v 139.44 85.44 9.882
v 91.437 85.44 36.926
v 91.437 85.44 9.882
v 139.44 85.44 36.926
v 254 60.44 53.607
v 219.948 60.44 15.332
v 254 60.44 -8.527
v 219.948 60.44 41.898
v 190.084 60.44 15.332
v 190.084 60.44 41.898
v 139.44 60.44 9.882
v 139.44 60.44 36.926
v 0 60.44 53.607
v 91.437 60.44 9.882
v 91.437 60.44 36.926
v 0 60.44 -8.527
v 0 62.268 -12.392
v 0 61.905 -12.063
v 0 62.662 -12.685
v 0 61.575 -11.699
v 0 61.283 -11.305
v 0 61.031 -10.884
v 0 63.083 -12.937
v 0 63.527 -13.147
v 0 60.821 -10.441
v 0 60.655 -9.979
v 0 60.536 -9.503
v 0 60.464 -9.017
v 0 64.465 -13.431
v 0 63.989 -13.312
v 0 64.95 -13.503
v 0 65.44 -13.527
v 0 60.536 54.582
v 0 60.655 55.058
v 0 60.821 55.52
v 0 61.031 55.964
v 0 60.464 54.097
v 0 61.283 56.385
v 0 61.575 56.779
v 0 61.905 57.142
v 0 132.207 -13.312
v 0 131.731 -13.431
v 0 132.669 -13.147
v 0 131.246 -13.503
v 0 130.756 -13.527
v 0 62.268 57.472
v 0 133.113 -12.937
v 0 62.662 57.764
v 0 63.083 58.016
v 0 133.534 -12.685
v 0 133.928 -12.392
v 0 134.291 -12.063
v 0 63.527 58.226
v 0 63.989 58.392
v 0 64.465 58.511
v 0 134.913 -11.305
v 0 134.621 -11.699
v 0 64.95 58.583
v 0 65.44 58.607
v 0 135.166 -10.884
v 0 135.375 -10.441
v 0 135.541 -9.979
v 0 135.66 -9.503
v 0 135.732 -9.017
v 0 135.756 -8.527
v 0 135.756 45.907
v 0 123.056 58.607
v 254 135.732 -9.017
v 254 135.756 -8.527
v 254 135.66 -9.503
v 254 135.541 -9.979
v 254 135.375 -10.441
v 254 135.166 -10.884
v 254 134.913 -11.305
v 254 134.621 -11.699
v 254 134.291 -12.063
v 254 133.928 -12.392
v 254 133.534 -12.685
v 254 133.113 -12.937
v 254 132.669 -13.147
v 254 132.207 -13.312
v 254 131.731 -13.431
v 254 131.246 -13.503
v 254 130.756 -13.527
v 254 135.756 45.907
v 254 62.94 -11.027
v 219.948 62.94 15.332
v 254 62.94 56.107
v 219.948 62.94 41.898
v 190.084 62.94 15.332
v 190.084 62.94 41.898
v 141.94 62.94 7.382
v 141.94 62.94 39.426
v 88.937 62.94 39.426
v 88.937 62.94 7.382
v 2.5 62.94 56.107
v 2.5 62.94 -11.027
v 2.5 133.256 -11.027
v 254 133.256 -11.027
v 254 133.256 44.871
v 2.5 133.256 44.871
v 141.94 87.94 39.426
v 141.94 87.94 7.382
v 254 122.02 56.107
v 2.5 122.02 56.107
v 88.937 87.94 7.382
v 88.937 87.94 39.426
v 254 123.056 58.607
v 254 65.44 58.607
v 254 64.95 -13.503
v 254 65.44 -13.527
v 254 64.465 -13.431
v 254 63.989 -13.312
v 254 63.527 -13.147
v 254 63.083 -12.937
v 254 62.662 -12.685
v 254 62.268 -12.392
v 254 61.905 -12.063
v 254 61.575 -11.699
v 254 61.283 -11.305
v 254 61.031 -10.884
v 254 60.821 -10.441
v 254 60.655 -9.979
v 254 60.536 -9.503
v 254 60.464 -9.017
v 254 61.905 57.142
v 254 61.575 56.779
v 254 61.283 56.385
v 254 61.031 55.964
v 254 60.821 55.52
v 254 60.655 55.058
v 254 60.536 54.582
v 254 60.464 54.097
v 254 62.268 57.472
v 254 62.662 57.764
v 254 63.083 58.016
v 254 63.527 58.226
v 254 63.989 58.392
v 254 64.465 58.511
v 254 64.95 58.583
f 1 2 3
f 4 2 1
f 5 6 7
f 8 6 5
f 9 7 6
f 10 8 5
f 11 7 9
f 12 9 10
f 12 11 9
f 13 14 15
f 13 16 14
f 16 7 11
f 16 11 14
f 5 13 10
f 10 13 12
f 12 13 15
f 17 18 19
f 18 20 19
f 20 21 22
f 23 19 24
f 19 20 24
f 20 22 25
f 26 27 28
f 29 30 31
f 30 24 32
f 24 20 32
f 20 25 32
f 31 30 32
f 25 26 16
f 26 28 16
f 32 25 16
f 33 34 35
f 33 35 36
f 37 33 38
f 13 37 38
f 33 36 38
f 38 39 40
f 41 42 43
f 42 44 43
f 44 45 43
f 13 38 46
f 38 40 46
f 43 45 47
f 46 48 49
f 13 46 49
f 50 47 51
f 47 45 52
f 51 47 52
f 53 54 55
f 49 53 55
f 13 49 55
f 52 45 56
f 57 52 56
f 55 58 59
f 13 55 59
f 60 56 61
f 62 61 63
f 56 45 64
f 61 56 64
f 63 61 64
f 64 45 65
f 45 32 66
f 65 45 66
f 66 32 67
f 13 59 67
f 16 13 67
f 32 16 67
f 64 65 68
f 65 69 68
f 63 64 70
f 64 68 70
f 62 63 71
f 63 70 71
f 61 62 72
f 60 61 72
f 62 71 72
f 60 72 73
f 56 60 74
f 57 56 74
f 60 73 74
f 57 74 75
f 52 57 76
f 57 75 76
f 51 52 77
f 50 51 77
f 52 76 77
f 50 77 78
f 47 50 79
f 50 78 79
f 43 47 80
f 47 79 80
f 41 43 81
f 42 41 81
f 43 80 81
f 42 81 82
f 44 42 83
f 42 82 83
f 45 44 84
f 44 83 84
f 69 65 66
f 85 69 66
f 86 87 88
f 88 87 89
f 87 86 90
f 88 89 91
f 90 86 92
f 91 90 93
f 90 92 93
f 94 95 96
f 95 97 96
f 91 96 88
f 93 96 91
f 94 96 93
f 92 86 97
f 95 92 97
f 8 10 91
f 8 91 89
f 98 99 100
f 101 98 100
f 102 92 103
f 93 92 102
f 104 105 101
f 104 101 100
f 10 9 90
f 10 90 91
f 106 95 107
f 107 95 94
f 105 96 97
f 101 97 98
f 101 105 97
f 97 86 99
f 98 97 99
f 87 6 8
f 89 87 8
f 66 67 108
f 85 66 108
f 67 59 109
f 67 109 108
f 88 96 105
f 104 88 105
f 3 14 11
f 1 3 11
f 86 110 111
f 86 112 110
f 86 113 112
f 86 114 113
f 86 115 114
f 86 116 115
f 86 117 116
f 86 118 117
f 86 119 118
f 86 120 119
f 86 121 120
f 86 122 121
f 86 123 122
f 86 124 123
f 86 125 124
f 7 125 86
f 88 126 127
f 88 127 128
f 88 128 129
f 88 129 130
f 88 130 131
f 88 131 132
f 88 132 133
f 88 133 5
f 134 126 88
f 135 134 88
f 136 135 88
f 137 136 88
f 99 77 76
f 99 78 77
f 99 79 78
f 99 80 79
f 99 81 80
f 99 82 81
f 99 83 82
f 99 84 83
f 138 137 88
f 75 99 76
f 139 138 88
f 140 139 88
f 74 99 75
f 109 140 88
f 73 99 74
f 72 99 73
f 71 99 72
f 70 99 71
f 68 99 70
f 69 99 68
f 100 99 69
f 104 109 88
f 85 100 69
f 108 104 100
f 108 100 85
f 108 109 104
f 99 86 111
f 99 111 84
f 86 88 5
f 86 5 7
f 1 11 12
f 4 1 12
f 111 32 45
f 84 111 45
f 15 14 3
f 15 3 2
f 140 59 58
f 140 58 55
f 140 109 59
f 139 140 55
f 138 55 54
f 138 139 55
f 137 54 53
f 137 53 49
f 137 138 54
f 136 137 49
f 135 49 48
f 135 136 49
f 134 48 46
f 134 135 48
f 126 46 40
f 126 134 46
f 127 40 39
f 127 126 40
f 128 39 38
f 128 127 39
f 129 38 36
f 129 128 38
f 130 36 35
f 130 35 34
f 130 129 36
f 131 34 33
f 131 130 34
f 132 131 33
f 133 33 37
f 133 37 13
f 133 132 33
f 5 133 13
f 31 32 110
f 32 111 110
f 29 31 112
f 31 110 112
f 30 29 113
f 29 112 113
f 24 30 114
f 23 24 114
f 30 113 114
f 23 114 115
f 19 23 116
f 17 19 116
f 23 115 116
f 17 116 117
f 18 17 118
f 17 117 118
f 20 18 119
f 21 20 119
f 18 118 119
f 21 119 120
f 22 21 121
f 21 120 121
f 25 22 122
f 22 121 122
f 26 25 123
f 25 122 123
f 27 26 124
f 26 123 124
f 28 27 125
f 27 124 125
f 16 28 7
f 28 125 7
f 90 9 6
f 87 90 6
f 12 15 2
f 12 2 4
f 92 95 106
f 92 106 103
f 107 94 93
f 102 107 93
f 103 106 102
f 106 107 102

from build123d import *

# Parameters (mm, degrees)
F0_W     = 75.315695256
F0_H     = 72.1342116594
F1_DEPTH = 254
F2_SIZE  = 12.7
F3_W     = 48.0028837919
F3_H     = 27.0442329347
F4_DEPTH = 25
F5_T     = -2.5
F6_R     = 5
F7_W     = 29.8640429974
F7_H     = 26.566028595
F8_DEPTH = 25


with BuildPart() as f1:
    # F0 (on Right) → F1 (new body)
    with BuildSketch(Plane.YZ):
        with Locations((98.0980489403, 22.5397534668)):
            Rectangle(F0_W, F0_H)
    extrude(amount=F1_DEPTH)

    # F2
    f2_edges = [f1.edges().sort_by_distance(p)[0] for p in [
        (127, 135.755897, 58.606859),
    ]]
    chamfer(f2_edges, length=F2_SIZE)

    # F3 (on face) → F4 (cut)
    with BuildSketch(Plane.XZ.offset(-60.4402013123)):
        with Locations((115.4388412833, 23.4042126685)):
            Rectangle(F3_W, F3_H)
    extrude(amount=-F4_DEPTH, mode=Mode.SUBTRACT)

    # F5
    f5_openings = [f1.faces().sort_by_distance(p)[0] for p in [
        (254, 97.59442, 22.060093),
    ]]
    offset(amount=F5_T, openings=f5_openings, kind=Kind.INTERSECTION)

    # F6
    f6_edges = [f1.edges().sort_by_distance(p)[0] for p in [
        (127, 60.440201, -13.527352),
        (127, 60.440201, 58.606859),
        (127, 135.755897, -13.527352),
    ]]
    fillet(f6_edges, radius=F6_R)

    # F7 (on face) → F8 (cut)
    with BuildSketch(Plane.XZ.offset(-60.4402013123)):
        with Locations((205.0164192915, 28.6153107882)):
            Rectangle(F7_W, F7_H)
    extrude(amount=-F8_DEPTH, mode=Mode.SUBTRACT)


solid = f1.part
